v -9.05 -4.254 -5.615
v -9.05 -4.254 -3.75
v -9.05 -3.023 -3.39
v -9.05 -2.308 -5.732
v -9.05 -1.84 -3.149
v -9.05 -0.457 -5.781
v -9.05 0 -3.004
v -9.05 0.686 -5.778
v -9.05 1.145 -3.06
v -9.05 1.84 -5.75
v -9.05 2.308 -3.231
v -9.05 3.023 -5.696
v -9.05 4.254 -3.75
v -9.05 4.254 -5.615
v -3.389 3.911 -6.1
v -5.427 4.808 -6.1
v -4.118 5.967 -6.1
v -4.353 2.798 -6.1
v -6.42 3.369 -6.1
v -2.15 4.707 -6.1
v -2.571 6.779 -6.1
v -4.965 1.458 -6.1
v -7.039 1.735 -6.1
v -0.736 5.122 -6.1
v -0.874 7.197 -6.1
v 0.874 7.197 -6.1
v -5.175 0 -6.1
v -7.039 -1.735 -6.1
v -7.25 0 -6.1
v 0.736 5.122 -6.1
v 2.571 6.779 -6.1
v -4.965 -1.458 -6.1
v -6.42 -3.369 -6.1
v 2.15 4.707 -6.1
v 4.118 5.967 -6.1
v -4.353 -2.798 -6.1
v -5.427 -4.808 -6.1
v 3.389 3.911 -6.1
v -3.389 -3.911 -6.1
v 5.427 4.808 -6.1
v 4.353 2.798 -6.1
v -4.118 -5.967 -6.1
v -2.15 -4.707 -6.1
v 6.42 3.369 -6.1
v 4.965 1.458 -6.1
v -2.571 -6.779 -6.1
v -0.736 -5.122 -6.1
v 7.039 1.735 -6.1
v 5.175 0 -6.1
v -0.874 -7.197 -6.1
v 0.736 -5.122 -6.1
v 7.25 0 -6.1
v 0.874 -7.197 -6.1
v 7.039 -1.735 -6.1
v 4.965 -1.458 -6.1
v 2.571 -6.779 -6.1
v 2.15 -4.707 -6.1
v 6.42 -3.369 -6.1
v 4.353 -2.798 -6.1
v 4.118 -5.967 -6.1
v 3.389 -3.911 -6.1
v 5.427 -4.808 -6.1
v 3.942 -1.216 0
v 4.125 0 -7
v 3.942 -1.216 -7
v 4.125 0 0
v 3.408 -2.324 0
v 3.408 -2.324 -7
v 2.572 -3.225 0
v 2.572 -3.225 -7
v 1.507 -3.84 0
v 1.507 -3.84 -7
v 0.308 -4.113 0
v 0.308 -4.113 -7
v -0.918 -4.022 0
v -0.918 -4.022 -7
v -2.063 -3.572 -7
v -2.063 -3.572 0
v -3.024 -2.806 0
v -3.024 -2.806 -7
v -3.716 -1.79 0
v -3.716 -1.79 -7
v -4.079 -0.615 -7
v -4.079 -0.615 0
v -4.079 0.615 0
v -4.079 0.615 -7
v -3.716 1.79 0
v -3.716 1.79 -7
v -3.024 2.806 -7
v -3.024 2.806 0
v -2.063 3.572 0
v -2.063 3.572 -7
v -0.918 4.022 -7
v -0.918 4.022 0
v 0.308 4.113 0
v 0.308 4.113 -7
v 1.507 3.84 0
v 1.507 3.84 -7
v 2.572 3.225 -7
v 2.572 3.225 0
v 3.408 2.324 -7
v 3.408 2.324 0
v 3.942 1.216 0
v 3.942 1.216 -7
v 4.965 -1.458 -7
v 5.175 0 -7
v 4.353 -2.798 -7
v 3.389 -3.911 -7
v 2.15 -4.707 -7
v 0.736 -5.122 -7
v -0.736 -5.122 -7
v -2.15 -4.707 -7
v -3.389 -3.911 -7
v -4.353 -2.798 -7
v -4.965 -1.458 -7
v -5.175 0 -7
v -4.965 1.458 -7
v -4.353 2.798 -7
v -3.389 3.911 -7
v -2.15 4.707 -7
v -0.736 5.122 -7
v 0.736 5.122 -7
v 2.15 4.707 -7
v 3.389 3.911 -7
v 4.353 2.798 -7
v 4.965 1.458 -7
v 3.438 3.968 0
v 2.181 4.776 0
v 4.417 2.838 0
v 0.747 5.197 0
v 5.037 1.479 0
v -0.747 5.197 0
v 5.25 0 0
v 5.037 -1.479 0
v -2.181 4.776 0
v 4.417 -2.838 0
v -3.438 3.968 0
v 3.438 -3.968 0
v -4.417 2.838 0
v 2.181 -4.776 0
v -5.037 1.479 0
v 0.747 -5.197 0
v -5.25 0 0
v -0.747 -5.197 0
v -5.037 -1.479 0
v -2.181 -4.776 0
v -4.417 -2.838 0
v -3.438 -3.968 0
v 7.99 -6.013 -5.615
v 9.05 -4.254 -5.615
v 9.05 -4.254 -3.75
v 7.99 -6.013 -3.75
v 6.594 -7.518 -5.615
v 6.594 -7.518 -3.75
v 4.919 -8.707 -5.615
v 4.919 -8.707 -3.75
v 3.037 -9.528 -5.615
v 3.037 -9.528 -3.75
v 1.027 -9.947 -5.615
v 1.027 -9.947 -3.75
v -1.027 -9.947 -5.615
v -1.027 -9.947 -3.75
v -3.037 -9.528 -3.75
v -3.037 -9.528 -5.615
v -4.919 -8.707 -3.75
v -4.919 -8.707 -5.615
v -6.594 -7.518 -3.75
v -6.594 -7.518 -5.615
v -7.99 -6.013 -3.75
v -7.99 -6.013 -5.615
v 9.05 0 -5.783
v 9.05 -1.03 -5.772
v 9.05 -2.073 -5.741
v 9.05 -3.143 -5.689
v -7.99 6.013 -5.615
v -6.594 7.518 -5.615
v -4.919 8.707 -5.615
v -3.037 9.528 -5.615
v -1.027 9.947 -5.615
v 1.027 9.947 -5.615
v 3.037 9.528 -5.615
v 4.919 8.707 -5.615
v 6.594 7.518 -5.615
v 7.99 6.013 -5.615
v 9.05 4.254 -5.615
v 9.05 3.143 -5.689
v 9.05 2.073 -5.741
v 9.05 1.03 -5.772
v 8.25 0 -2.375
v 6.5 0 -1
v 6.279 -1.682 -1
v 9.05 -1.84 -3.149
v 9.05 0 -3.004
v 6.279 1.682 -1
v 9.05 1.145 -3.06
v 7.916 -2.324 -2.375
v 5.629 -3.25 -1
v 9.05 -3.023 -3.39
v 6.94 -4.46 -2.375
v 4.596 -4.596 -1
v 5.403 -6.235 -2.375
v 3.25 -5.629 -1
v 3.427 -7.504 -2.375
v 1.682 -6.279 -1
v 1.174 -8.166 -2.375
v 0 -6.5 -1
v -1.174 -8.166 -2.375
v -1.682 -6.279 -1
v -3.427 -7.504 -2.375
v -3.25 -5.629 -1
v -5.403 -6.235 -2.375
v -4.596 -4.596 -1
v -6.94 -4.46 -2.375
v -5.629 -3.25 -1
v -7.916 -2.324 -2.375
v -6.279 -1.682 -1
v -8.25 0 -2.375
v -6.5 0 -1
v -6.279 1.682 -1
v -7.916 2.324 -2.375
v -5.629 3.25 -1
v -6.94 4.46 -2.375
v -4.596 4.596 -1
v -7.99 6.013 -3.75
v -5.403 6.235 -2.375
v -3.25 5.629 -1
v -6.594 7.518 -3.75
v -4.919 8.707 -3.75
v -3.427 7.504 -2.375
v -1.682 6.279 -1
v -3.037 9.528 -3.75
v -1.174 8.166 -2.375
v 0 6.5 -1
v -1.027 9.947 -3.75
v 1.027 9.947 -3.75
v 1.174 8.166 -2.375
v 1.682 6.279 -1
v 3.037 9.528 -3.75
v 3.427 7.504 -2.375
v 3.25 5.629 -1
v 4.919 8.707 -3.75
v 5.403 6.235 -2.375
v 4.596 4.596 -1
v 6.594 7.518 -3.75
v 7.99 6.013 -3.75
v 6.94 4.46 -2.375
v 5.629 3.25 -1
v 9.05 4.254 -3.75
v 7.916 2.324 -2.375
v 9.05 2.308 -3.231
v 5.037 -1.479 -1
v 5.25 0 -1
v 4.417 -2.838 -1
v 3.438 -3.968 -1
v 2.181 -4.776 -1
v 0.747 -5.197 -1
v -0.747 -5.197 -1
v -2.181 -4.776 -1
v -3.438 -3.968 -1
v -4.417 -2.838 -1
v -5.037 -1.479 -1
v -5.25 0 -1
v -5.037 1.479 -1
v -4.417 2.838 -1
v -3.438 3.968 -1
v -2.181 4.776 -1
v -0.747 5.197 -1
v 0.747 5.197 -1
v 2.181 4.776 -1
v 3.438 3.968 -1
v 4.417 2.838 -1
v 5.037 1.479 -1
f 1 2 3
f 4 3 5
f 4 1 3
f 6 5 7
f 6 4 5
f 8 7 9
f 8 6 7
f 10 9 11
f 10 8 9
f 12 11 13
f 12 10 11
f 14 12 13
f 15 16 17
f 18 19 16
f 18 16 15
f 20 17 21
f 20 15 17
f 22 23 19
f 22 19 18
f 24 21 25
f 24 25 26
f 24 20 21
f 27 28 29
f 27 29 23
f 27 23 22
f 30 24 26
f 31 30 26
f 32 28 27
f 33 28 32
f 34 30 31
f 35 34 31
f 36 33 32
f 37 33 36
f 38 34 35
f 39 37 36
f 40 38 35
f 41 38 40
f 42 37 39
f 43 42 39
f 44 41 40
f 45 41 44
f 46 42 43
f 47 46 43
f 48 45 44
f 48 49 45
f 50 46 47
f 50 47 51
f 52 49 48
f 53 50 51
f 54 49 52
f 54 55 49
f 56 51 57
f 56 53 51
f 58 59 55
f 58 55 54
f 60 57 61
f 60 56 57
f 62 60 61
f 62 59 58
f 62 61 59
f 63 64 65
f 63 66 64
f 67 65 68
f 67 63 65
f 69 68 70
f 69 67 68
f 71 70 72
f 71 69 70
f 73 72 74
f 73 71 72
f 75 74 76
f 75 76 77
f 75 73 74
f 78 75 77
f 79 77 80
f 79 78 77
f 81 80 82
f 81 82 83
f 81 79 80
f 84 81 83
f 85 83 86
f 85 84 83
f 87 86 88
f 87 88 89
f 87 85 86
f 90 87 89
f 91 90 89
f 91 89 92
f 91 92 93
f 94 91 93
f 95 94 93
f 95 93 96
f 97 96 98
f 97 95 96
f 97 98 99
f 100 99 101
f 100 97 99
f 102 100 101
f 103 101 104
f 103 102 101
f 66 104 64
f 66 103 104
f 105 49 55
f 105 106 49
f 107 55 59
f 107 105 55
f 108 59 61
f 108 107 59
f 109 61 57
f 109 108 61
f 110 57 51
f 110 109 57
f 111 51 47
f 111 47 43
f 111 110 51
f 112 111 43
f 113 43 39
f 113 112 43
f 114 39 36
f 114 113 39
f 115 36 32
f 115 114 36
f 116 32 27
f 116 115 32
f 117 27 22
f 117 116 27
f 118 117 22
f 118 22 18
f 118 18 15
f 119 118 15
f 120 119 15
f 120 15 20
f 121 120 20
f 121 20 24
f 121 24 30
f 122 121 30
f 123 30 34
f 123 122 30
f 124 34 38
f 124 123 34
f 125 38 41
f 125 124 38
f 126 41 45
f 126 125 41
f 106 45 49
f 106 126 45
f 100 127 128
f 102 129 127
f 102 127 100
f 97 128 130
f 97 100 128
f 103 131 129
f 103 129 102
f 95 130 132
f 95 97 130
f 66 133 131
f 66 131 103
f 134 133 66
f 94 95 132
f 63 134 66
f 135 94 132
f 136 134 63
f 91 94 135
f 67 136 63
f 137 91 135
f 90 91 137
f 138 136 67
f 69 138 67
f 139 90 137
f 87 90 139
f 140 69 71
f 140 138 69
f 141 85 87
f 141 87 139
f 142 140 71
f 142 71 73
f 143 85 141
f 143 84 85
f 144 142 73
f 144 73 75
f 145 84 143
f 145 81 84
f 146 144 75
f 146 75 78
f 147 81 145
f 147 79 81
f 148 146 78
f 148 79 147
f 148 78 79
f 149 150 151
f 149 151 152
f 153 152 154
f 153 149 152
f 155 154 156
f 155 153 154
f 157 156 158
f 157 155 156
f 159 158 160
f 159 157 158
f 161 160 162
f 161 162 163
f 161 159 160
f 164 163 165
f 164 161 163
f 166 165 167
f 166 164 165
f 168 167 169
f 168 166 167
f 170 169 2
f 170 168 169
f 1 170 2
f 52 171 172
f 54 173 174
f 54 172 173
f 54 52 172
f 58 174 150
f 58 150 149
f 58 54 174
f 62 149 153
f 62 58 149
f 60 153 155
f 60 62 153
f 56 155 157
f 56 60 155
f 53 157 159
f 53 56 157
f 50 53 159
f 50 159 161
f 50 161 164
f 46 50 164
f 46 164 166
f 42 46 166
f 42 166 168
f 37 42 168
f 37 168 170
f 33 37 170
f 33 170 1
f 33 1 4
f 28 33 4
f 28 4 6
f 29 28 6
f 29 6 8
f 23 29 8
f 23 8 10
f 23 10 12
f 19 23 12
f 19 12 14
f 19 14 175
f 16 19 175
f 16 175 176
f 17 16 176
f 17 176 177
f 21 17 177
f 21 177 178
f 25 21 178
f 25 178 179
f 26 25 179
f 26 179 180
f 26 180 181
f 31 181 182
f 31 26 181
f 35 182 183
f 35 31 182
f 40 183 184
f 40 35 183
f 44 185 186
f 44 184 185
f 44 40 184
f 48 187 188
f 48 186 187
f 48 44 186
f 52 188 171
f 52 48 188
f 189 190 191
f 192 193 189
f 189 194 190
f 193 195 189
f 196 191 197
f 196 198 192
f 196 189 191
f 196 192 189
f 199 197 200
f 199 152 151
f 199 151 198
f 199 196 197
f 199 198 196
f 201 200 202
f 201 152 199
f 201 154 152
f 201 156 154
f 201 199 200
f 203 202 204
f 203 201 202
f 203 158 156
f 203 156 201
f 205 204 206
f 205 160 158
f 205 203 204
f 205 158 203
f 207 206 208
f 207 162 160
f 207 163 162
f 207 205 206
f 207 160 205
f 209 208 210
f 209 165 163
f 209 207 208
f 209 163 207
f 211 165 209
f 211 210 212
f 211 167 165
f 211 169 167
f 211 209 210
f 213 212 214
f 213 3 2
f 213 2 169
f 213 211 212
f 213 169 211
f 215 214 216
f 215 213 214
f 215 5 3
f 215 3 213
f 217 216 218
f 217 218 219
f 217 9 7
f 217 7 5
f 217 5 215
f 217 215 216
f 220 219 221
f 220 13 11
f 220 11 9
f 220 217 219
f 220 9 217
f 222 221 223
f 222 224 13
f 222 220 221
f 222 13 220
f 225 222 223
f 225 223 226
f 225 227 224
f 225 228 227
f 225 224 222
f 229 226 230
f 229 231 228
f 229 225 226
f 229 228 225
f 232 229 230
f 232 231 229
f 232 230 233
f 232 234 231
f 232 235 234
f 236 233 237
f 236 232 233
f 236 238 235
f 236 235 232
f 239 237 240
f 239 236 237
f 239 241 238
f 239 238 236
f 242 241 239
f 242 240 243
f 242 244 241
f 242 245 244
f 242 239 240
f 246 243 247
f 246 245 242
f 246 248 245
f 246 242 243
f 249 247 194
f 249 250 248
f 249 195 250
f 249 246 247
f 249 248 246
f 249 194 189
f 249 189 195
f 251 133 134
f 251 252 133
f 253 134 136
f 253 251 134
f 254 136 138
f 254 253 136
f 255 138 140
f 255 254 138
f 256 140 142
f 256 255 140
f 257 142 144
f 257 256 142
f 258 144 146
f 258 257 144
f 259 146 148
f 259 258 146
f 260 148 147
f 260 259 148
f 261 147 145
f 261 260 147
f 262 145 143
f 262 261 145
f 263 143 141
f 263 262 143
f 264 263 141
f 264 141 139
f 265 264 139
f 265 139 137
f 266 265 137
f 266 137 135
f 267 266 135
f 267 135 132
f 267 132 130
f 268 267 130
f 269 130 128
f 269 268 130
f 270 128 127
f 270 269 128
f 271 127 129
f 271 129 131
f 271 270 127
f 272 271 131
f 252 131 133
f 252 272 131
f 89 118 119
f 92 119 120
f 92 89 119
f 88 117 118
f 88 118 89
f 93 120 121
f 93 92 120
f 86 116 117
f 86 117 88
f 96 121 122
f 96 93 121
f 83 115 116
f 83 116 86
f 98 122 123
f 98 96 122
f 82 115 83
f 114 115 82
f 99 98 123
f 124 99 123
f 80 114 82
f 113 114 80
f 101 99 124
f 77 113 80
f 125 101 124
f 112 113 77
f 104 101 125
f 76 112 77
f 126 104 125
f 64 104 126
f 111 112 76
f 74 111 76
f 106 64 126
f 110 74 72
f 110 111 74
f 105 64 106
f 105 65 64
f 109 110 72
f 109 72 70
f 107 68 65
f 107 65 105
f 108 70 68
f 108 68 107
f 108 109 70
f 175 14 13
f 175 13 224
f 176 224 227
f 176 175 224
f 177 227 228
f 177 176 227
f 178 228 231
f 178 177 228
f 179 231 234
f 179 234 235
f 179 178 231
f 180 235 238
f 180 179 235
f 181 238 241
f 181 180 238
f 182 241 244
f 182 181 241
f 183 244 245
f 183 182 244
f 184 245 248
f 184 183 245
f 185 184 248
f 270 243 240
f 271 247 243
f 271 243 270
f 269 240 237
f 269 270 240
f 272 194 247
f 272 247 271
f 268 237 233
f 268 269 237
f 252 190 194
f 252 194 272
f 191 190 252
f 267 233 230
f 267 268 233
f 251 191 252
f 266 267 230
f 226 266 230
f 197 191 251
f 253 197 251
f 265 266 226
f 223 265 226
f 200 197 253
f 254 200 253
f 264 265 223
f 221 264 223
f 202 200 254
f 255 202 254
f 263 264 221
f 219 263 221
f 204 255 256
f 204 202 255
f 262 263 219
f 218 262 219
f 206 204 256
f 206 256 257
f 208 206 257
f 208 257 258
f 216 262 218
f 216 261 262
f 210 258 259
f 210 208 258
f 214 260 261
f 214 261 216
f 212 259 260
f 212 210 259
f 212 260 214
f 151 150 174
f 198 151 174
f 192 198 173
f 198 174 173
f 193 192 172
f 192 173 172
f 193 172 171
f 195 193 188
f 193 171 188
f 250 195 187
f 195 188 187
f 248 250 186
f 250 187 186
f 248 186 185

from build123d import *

# Parameters (mm, degrees)
CUT_EXTRUDE1_REACH = 17.402
SKETCH2_W          = 3.052308152
SKETCH2_H          = 16.366405324


with BuildPart() as part:
    # Sketch1 → Revolve1 (revolve)
    with BuildSketch(Plane(origin=(0, 0, 0), x_dir=(0, 0, -1), z_dir=(1, 0, 0)), mode=Mode.PRIVATE) as revolve1_sk:
        Polygon((0, 4.125), (0, 5.25), (1, 5.25), (1, 6.5), (3.75, 10), (5.615100803, 10), (6.1, 7.25), (6.1, 5.175), (7, 5.175), (7, 4.125), align=None)
    revolve(revolve1_sk.sketch.rotate(Axis((0, 0, 0), (0, 0, -1)), 90), axis=Axis((0, 0, 0), (0, 0, -1)))

    # Cut-Extrude1: up to this cone (the profile starts inside it)
    cut_extrude1_end = Plane(origin=(0, 0, -6.1), z_dir=(0, 0, -1)).offset(-10.207141857) * Cone(1.273e-06, 52.309157025, 41.100050948, align=(Align.CENTER, Align.CENTER, Align.MIN), mode=Mode.PRIVATE)
    # Sketch2 → Cut-Extrude1 (cut, up to the surface)
    with BuildSketch(Plane(origin=(0, 0, -6.1), x_dir=(-1, 0, 0), z_dir=(0, 0, -1)), mode=Mode.PRIVATE) as cut_extrude1_sk1:
        with Locations((10.576154076, 0)):
            Rectangle(SKETCH2_W, SKETCH2_H)
    cut_extrude1_tool1 = extrude(cut_extrude1_sk1.sketch, amount=-CUT_EXTRUDE1_REACH, mode=Mode.PRIVATE) & cut_extrude1_end
    add(cut_extrude1_tool1.solids().sort_by_distance((-10.576154, 0, -6.1))[0], mode=Mode.SUBTRACT)
    # Sketch2 → Cut-Extrude1 (cut, up to the surface)
    with BuildSketch(Plane(origin=(0, 0, -6.1), x_dir=(-1, 0, 0), z_dir=(0, 0, -1)), mode=Mode.PRIVATE) as cut_extrude1_sk2:
        with Locations((-10.576154076, 0)):
            Rectangle(SKETCH2_W, SKETCH2_H)
    cut_extrude1_tool2 = extrude(cut_extrude1_sk2.sketch, amount=-CUT_EXTRUDE1_REACH, mode=Mode.PRIVATE) & cut_extrude1_end
    add(cut_extrude1_tool2.solids().sort_by_distance((10.576154, 0, -6.1))[0], mode=Mode.SUBTRACT)


solid = part.part
